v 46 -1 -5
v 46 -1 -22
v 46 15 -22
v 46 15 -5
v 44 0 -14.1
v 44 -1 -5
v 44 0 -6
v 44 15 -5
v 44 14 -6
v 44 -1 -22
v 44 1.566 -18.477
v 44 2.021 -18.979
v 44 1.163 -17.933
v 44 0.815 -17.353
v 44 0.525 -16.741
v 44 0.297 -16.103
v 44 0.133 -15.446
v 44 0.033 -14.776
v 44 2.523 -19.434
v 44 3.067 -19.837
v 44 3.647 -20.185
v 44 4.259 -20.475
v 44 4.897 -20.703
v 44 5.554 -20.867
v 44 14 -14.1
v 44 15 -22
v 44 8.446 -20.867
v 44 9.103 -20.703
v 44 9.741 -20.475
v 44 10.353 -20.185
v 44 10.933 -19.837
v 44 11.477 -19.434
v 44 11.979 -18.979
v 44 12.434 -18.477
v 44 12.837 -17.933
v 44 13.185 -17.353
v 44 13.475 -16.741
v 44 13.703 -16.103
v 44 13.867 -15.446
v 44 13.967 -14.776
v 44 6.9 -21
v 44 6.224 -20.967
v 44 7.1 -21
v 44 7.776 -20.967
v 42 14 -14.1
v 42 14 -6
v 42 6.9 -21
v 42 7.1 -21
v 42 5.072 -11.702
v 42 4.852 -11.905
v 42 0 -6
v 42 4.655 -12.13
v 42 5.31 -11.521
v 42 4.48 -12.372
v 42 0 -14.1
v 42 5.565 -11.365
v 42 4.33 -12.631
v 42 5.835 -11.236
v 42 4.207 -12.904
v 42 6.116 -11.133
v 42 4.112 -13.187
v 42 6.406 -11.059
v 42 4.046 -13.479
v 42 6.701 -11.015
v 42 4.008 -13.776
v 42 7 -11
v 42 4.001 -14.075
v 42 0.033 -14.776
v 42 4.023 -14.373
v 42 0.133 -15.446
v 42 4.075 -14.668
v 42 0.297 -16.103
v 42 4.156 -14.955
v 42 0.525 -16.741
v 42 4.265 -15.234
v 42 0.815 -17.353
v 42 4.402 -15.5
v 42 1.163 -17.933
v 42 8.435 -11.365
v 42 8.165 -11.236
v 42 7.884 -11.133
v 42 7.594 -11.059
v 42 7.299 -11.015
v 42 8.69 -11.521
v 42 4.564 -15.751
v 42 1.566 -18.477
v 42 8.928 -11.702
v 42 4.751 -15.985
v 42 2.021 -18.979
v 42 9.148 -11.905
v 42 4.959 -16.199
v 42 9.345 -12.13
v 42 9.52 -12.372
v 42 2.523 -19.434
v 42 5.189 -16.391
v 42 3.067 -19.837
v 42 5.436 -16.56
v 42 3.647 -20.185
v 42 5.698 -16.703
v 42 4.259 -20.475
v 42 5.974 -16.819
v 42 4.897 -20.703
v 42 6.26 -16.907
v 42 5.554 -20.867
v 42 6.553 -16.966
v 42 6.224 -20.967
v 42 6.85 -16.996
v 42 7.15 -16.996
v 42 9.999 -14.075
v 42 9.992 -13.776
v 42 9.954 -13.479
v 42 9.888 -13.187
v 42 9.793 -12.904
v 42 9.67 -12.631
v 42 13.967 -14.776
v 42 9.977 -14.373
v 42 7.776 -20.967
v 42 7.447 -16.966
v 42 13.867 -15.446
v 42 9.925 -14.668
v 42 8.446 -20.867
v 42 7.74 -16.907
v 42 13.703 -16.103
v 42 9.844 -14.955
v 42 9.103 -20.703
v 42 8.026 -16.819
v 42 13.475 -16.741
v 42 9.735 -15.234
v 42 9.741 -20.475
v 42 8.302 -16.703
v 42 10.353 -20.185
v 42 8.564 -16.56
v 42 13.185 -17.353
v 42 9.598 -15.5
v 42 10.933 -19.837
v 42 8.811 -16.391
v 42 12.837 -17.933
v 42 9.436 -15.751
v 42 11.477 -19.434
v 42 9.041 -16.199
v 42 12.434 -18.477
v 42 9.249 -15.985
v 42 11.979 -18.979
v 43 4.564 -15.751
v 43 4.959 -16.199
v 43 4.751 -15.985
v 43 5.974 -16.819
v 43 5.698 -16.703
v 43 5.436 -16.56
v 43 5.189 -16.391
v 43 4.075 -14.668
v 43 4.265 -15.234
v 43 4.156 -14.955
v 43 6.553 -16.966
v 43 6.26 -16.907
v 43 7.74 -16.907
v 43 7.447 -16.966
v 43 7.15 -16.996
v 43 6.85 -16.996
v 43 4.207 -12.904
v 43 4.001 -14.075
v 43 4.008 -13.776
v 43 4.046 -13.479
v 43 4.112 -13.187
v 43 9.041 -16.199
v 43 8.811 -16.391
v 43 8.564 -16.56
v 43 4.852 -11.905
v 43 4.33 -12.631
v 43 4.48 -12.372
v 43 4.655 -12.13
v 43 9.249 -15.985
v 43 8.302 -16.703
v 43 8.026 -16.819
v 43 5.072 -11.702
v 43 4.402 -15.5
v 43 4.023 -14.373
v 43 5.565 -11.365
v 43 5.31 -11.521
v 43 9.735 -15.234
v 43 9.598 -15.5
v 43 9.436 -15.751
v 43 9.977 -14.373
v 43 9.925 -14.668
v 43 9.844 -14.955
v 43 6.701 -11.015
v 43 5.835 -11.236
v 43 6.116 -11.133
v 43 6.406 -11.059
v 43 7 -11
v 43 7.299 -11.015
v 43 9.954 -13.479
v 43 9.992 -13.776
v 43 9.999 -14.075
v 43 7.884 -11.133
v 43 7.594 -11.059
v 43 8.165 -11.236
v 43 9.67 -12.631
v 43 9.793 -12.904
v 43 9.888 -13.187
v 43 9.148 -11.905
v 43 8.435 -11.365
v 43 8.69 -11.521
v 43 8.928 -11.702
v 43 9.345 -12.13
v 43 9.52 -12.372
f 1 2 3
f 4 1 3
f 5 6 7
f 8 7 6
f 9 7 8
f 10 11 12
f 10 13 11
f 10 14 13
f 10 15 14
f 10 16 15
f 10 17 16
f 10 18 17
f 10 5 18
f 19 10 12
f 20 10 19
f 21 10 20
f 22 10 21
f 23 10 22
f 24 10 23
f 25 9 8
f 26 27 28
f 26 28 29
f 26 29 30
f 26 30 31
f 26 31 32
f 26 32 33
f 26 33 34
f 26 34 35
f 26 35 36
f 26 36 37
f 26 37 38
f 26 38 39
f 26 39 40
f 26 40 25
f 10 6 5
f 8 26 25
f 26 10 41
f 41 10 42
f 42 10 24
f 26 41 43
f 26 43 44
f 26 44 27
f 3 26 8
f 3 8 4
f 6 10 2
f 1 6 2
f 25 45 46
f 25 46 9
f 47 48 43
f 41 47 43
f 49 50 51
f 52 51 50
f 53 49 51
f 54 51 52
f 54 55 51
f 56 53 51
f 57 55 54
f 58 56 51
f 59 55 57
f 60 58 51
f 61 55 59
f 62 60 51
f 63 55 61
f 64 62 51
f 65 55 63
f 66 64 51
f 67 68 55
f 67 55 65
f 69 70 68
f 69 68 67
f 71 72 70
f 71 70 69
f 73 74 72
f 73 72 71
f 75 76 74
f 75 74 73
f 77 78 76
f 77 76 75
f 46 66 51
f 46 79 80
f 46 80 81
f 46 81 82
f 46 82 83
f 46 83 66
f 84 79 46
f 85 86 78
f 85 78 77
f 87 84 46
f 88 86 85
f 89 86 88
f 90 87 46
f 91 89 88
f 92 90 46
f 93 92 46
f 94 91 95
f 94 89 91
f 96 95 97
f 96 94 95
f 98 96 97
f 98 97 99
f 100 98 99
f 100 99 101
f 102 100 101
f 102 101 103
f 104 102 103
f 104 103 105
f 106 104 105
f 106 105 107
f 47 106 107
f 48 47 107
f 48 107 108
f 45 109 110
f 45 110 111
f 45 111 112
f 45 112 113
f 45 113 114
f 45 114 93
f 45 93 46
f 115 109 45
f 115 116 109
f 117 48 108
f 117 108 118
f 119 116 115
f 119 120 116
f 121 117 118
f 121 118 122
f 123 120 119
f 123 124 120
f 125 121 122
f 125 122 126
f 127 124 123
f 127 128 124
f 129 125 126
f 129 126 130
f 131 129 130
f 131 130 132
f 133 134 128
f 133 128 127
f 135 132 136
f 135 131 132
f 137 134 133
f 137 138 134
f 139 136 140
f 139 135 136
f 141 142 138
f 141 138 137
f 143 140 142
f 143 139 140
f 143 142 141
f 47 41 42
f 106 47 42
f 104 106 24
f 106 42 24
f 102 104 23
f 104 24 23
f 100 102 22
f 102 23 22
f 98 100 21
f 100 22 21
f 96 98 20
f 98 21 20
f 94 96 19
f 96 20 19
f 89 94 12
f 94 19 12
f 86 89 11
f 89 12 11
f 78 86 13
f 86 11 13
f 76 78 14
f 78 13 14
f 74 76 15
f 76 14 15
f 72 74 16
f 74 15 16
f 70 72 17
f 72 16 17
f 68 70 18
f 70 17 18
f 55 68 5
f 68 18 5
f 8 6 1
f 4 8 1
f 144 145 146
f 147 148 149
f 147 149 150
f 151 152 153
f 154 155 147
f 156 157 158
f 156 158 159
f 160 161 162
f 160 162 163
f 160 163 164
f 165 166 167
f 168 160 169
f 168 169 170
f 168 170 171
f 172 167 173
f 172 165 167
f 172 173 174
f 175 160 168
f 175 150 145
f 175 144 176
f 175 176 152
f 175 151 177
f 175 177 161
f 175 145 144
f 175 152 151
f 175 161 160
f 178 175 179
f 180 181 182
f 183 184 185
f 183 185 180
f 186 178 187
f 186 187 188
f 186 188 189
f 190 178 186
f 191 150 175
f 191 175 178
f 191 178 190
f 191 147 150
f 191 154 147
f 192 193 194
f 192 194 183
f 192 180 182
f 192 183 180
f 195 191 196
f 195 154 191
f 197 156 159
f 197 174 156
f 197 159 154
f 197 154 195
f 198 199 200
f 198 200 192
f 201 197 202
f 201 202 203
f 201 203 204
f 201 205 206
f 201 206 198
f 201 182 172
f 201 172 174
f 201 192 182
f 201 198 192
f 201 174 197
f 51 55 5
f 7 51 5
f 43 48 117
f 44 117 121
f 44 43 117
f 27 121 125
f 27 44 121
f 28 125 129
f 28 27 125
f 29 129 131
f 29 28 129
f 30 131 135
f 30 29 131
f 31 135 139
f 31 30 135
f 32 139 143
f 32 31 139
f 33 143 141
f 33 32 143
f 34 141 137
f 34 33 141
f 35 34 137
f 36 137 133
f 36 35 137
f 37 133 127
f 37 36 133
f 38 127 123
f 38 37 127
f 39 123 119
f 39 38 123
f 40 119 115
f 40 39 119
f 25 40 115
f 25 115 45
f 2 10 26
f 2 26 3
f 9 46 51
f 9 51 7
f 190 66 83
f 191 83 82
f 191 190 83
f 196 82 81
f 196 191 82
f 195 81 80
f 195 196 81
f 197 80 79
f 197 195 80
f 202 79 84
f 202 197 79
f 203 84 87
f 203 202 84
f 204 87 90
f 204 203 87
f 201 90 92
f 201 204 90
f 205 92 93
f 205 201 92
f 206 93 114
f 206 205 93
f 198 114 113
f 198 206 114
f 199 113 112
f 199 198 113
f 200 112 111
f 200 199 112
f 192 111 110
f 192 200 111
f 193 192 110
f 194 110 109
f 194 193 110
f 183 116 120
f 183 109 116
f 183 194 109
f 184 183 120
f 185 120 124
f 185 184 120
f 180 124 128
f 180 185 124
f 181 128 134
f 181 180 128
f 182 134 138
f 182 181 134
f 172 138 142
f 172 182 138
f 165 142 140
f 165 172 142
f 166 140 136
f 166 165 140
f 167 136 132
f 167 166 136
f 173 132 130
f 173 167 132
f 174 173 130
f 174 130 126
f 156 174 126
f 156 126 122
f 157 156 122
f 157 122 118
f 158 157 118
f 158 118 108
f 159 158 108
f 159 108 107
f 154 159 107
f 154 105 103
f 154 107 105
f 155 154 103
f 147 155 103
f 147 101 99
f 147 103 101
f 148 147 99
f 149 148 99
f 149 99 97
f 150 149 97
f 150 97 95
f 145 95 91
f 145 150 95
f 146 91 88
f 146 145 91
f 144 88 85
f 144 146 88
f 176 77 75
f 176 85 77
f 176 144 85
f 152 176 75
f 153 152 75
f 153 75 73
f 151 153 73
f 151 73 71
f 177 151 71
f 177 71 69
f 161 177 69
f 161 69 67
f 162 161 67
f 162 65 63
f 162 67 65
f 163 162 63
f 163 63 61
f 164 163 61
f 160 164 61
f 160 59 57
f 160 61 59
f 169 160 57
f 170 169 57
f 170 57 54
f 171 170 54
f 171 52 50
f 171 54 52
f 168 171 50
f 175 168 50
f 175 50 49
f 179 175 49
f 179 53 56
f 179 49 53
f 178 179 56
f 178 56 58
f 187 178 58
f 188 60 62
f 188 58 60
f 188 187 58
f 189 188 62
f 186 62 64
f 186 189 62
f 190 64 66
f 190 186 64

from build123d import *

# Parameters (mm, degrees)
CYLINDER_R           = 3
CYLINDER_DEPTH       = 10
CYLINDER_PITCH_ANGLE = -90
BOX032_W             = 54
BOX032_H             = 14
BOX032_DEPTH         = 15
BOX033_W             = 54
BOX033_H             = 16
BOX033_DEPTH         = 17
FILLET002_R          = 6.9
FILLET003_R          = 6.9
BOX_W                = 4
BOX_H                = 16
BOX_DEPTH            = 17


with BuildPart() as cylinder:
    # Cylinder → Cylinder (new body)
    with BuildSketch(Plane.XY):
        Circle(CYLINDER_R)
    extrude(amount=CYLINDER_DEPTH)


with BuildPart() as cylinder_1:
    # Cylinder pitch: moved
    add(cylinder.part.rotate(Axis((0, 0, 0), (0, 1, 0)), CYLINDER_PITCH_ANGLE))


with BuildPart() as cylinder_2:
    # Cylinder placement: moved
    add(cylinder_1.part.moved(Location((47, 7, -14))))


with BuildPart() as batterypack004:
    # Box032 → Box032 (new body)
    with BuildSketch(Plane(origin=(-9, 0, -21), x_dir=(1, 0, 0), z_dir=(0, 0, 1))):
        with Locations((27, 7)):
            Rectangle(BOX032_W, BOX032_H)
    extrude(amount=BOX032_DEPTH)


with BuildPart() as fillet003:
    # Box033 → Box033 (new body)
    with BuildSketch(Plane(origin=(-10, -1, -22), x_dir=(1, 0, 0), z_dir=(0, 0, 1))):
        with Locations((27, 8)):
            Rectangle(BOX033_W, BOX033_H)
    extrude(amount=BOX033_DEPTH)

    # Cut001: cut BatteryPack004
    add(batterypack004.part, mode=Mode.SUBTRACT)

    # Fillet002
    fillet002_edges = [fillet003.edges().sort_by_distance(p)[0] for p in [
        (17.5, 0, -21),
    ]]
    fillet(fillet002_edges, radius=FILLET002_R)

    # Fillet003
    fillet003_edges = [fillet003.edges().sort_by_distance(p)[0] for p in [
        (17.5, 14, -21),
    ]]
    fillet(fillet003_edges, radius=FILLET003_R)


with BuildPart() as cap:
    # Box → Box (new body)
    with BuildSketch(Plane(origin=(42, -1, -22), x_dir=(1, 0, 0), z_dir=(0, 0, 1))):
        with Locations((2, 8)):
            Rectangle(BOX_W, BOX_H)
    extrude(amount=BOX_DEPTH)

    # Cut002: cut Fillet003
    add(fillet003.part, mode=Mode.SUBTRACT)


with BuildPart() as cap_1:
    # Cut002 placement: moved
    add(cap.part.moved(Location((4, 0, 0))))

    # Cut003: cut Cylinder
    add(cylinder_2.part, mode=Mode.SUBTRACT)


with BuildPart() as cap_2:
    # Cut003 placement: moved
    add(cap_1.part.moved(Location((-4, 0, 0))))


solid = cap_2.part
